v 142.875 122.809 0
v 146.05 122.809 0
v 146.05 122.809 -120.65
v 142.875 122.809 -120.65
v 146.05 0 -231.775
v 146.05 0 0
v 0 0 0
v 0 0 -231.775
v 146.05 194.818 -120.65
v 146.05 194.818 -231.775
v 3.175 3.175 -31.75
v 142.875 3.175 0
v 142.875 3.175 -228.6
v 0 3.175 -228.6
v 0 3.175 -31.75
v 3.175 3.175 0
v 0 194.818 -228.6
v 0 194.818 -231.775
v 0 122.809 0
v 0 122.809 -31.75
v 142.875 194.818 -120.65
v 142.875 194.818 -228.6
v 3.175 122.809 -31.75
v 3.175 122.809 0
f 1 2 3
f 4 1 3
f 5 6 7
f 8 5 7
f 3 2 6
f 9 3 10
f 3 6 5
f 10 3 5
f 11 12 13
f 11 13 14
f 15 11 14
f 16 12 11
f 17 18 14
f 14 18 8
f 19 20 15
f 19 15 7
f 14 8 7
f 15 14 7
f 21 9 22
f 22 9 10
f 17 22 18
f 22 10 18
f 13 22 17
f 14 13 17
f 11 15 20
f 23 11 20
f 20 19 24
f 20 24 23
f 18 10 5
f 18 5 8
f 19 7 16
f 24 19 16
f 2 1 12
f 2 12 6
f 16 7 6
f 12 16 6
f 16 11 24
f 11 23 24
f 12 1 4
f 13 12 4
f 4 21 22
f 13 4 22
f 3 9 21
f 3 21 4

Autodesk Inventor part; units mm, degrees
ref_plane "YZ Plane" through (0, 0, 0) normal (1, 0, 0) x (0, 1, 0)
ref_plane "XZ Plane" through (0, 0, 0) normal (0, 1, 0) x (-1, 0, 0)
ref_plane "XY Plane" through (0, 0, 0) normal (0, 0, 1) x (1, 0, 0)
sketch "Sketch1" plane through (0, 0, 0) normal (0, 1, 0) x (-1, 0, 0)
  line L0 (0, 0) -> (-146.05, 0)
  line L1 (-146.05, 0) -> (-146.05, -231.775)
  line L2 (-146.05, -231.775) -> (0, -231.775)
  line L3 (0, -231.775) -> (0, 0)
  dimension "d0" = 146.05
  dimension "d1" = 231.775
extrude "Extrusion1" add sketch "Sketch1" along normal blind 3.175
sketch "Sketch2" plane through (146.05, 0, 0) normal (1, 0, 0) x (0, 0, -1)
  line L0 (0, 0) -> (231.775, 0) projected
  line L1 (231.775, 0) -> (231.775, 194.818)
  line L2 (231.775, 194.818) -> (120.65, 194.818)
  line L3 (120.65, 194.818) -> (120.65, 122.809)
  line L4 (0, 0) -> (0, 122.809)
  line L5 (0, 122.809) -> (120.65, 122.809)
  dimension "d4" = 194.818
  dimension "d5" = 111.125
  dimension "d6" = 72.009
  dimension "d7" = 122.809
extrude "Extrusion2" add sketch "Sketch2" against normal blind 3.175
sketch "Sketch3" plane through (146.05, 0, -231.775) normal (0, 0, -1) x (-1, 0, 0)
  line L0 (0, 0) -> (0, 194.818) projected
  line L1 (0, 194.818) -> (146.05, 194.818)
  line L2 (146.05, 194.818) -> (146.05, 0)
  line L3 (146.05, 0) -> (0, 0)
  line L4 (0, 0) -> (0, 194.818)
extrude "Extrusion3" add sketch "Sketch3" against normal blind 3.175
sketch "Sketch4" plane through (0, 0, -231.775) normal (-1, 0, 0) x (0, 0, 1)
  line L0 (231.775, 0) -> (231.775, 3.175) projected
  line L1 (231.775, 122.809) -> (111.125, 122.809) projected
  line L2 (231.775, 0) -> (200.025, 0)
  line L3 (200.025, 0) -> (200.025, 122.809)
  line L4 (200.025, 122.809) -> (231.775, 122.809)
  line L5 (231.775, 122.809) -> (231.775, 0)
  dimension "d12" = 31.75
extrude "Extrusion4" add sketch "Sketch4" against normal blind 3.175
properties part number "Shooting_Case"
